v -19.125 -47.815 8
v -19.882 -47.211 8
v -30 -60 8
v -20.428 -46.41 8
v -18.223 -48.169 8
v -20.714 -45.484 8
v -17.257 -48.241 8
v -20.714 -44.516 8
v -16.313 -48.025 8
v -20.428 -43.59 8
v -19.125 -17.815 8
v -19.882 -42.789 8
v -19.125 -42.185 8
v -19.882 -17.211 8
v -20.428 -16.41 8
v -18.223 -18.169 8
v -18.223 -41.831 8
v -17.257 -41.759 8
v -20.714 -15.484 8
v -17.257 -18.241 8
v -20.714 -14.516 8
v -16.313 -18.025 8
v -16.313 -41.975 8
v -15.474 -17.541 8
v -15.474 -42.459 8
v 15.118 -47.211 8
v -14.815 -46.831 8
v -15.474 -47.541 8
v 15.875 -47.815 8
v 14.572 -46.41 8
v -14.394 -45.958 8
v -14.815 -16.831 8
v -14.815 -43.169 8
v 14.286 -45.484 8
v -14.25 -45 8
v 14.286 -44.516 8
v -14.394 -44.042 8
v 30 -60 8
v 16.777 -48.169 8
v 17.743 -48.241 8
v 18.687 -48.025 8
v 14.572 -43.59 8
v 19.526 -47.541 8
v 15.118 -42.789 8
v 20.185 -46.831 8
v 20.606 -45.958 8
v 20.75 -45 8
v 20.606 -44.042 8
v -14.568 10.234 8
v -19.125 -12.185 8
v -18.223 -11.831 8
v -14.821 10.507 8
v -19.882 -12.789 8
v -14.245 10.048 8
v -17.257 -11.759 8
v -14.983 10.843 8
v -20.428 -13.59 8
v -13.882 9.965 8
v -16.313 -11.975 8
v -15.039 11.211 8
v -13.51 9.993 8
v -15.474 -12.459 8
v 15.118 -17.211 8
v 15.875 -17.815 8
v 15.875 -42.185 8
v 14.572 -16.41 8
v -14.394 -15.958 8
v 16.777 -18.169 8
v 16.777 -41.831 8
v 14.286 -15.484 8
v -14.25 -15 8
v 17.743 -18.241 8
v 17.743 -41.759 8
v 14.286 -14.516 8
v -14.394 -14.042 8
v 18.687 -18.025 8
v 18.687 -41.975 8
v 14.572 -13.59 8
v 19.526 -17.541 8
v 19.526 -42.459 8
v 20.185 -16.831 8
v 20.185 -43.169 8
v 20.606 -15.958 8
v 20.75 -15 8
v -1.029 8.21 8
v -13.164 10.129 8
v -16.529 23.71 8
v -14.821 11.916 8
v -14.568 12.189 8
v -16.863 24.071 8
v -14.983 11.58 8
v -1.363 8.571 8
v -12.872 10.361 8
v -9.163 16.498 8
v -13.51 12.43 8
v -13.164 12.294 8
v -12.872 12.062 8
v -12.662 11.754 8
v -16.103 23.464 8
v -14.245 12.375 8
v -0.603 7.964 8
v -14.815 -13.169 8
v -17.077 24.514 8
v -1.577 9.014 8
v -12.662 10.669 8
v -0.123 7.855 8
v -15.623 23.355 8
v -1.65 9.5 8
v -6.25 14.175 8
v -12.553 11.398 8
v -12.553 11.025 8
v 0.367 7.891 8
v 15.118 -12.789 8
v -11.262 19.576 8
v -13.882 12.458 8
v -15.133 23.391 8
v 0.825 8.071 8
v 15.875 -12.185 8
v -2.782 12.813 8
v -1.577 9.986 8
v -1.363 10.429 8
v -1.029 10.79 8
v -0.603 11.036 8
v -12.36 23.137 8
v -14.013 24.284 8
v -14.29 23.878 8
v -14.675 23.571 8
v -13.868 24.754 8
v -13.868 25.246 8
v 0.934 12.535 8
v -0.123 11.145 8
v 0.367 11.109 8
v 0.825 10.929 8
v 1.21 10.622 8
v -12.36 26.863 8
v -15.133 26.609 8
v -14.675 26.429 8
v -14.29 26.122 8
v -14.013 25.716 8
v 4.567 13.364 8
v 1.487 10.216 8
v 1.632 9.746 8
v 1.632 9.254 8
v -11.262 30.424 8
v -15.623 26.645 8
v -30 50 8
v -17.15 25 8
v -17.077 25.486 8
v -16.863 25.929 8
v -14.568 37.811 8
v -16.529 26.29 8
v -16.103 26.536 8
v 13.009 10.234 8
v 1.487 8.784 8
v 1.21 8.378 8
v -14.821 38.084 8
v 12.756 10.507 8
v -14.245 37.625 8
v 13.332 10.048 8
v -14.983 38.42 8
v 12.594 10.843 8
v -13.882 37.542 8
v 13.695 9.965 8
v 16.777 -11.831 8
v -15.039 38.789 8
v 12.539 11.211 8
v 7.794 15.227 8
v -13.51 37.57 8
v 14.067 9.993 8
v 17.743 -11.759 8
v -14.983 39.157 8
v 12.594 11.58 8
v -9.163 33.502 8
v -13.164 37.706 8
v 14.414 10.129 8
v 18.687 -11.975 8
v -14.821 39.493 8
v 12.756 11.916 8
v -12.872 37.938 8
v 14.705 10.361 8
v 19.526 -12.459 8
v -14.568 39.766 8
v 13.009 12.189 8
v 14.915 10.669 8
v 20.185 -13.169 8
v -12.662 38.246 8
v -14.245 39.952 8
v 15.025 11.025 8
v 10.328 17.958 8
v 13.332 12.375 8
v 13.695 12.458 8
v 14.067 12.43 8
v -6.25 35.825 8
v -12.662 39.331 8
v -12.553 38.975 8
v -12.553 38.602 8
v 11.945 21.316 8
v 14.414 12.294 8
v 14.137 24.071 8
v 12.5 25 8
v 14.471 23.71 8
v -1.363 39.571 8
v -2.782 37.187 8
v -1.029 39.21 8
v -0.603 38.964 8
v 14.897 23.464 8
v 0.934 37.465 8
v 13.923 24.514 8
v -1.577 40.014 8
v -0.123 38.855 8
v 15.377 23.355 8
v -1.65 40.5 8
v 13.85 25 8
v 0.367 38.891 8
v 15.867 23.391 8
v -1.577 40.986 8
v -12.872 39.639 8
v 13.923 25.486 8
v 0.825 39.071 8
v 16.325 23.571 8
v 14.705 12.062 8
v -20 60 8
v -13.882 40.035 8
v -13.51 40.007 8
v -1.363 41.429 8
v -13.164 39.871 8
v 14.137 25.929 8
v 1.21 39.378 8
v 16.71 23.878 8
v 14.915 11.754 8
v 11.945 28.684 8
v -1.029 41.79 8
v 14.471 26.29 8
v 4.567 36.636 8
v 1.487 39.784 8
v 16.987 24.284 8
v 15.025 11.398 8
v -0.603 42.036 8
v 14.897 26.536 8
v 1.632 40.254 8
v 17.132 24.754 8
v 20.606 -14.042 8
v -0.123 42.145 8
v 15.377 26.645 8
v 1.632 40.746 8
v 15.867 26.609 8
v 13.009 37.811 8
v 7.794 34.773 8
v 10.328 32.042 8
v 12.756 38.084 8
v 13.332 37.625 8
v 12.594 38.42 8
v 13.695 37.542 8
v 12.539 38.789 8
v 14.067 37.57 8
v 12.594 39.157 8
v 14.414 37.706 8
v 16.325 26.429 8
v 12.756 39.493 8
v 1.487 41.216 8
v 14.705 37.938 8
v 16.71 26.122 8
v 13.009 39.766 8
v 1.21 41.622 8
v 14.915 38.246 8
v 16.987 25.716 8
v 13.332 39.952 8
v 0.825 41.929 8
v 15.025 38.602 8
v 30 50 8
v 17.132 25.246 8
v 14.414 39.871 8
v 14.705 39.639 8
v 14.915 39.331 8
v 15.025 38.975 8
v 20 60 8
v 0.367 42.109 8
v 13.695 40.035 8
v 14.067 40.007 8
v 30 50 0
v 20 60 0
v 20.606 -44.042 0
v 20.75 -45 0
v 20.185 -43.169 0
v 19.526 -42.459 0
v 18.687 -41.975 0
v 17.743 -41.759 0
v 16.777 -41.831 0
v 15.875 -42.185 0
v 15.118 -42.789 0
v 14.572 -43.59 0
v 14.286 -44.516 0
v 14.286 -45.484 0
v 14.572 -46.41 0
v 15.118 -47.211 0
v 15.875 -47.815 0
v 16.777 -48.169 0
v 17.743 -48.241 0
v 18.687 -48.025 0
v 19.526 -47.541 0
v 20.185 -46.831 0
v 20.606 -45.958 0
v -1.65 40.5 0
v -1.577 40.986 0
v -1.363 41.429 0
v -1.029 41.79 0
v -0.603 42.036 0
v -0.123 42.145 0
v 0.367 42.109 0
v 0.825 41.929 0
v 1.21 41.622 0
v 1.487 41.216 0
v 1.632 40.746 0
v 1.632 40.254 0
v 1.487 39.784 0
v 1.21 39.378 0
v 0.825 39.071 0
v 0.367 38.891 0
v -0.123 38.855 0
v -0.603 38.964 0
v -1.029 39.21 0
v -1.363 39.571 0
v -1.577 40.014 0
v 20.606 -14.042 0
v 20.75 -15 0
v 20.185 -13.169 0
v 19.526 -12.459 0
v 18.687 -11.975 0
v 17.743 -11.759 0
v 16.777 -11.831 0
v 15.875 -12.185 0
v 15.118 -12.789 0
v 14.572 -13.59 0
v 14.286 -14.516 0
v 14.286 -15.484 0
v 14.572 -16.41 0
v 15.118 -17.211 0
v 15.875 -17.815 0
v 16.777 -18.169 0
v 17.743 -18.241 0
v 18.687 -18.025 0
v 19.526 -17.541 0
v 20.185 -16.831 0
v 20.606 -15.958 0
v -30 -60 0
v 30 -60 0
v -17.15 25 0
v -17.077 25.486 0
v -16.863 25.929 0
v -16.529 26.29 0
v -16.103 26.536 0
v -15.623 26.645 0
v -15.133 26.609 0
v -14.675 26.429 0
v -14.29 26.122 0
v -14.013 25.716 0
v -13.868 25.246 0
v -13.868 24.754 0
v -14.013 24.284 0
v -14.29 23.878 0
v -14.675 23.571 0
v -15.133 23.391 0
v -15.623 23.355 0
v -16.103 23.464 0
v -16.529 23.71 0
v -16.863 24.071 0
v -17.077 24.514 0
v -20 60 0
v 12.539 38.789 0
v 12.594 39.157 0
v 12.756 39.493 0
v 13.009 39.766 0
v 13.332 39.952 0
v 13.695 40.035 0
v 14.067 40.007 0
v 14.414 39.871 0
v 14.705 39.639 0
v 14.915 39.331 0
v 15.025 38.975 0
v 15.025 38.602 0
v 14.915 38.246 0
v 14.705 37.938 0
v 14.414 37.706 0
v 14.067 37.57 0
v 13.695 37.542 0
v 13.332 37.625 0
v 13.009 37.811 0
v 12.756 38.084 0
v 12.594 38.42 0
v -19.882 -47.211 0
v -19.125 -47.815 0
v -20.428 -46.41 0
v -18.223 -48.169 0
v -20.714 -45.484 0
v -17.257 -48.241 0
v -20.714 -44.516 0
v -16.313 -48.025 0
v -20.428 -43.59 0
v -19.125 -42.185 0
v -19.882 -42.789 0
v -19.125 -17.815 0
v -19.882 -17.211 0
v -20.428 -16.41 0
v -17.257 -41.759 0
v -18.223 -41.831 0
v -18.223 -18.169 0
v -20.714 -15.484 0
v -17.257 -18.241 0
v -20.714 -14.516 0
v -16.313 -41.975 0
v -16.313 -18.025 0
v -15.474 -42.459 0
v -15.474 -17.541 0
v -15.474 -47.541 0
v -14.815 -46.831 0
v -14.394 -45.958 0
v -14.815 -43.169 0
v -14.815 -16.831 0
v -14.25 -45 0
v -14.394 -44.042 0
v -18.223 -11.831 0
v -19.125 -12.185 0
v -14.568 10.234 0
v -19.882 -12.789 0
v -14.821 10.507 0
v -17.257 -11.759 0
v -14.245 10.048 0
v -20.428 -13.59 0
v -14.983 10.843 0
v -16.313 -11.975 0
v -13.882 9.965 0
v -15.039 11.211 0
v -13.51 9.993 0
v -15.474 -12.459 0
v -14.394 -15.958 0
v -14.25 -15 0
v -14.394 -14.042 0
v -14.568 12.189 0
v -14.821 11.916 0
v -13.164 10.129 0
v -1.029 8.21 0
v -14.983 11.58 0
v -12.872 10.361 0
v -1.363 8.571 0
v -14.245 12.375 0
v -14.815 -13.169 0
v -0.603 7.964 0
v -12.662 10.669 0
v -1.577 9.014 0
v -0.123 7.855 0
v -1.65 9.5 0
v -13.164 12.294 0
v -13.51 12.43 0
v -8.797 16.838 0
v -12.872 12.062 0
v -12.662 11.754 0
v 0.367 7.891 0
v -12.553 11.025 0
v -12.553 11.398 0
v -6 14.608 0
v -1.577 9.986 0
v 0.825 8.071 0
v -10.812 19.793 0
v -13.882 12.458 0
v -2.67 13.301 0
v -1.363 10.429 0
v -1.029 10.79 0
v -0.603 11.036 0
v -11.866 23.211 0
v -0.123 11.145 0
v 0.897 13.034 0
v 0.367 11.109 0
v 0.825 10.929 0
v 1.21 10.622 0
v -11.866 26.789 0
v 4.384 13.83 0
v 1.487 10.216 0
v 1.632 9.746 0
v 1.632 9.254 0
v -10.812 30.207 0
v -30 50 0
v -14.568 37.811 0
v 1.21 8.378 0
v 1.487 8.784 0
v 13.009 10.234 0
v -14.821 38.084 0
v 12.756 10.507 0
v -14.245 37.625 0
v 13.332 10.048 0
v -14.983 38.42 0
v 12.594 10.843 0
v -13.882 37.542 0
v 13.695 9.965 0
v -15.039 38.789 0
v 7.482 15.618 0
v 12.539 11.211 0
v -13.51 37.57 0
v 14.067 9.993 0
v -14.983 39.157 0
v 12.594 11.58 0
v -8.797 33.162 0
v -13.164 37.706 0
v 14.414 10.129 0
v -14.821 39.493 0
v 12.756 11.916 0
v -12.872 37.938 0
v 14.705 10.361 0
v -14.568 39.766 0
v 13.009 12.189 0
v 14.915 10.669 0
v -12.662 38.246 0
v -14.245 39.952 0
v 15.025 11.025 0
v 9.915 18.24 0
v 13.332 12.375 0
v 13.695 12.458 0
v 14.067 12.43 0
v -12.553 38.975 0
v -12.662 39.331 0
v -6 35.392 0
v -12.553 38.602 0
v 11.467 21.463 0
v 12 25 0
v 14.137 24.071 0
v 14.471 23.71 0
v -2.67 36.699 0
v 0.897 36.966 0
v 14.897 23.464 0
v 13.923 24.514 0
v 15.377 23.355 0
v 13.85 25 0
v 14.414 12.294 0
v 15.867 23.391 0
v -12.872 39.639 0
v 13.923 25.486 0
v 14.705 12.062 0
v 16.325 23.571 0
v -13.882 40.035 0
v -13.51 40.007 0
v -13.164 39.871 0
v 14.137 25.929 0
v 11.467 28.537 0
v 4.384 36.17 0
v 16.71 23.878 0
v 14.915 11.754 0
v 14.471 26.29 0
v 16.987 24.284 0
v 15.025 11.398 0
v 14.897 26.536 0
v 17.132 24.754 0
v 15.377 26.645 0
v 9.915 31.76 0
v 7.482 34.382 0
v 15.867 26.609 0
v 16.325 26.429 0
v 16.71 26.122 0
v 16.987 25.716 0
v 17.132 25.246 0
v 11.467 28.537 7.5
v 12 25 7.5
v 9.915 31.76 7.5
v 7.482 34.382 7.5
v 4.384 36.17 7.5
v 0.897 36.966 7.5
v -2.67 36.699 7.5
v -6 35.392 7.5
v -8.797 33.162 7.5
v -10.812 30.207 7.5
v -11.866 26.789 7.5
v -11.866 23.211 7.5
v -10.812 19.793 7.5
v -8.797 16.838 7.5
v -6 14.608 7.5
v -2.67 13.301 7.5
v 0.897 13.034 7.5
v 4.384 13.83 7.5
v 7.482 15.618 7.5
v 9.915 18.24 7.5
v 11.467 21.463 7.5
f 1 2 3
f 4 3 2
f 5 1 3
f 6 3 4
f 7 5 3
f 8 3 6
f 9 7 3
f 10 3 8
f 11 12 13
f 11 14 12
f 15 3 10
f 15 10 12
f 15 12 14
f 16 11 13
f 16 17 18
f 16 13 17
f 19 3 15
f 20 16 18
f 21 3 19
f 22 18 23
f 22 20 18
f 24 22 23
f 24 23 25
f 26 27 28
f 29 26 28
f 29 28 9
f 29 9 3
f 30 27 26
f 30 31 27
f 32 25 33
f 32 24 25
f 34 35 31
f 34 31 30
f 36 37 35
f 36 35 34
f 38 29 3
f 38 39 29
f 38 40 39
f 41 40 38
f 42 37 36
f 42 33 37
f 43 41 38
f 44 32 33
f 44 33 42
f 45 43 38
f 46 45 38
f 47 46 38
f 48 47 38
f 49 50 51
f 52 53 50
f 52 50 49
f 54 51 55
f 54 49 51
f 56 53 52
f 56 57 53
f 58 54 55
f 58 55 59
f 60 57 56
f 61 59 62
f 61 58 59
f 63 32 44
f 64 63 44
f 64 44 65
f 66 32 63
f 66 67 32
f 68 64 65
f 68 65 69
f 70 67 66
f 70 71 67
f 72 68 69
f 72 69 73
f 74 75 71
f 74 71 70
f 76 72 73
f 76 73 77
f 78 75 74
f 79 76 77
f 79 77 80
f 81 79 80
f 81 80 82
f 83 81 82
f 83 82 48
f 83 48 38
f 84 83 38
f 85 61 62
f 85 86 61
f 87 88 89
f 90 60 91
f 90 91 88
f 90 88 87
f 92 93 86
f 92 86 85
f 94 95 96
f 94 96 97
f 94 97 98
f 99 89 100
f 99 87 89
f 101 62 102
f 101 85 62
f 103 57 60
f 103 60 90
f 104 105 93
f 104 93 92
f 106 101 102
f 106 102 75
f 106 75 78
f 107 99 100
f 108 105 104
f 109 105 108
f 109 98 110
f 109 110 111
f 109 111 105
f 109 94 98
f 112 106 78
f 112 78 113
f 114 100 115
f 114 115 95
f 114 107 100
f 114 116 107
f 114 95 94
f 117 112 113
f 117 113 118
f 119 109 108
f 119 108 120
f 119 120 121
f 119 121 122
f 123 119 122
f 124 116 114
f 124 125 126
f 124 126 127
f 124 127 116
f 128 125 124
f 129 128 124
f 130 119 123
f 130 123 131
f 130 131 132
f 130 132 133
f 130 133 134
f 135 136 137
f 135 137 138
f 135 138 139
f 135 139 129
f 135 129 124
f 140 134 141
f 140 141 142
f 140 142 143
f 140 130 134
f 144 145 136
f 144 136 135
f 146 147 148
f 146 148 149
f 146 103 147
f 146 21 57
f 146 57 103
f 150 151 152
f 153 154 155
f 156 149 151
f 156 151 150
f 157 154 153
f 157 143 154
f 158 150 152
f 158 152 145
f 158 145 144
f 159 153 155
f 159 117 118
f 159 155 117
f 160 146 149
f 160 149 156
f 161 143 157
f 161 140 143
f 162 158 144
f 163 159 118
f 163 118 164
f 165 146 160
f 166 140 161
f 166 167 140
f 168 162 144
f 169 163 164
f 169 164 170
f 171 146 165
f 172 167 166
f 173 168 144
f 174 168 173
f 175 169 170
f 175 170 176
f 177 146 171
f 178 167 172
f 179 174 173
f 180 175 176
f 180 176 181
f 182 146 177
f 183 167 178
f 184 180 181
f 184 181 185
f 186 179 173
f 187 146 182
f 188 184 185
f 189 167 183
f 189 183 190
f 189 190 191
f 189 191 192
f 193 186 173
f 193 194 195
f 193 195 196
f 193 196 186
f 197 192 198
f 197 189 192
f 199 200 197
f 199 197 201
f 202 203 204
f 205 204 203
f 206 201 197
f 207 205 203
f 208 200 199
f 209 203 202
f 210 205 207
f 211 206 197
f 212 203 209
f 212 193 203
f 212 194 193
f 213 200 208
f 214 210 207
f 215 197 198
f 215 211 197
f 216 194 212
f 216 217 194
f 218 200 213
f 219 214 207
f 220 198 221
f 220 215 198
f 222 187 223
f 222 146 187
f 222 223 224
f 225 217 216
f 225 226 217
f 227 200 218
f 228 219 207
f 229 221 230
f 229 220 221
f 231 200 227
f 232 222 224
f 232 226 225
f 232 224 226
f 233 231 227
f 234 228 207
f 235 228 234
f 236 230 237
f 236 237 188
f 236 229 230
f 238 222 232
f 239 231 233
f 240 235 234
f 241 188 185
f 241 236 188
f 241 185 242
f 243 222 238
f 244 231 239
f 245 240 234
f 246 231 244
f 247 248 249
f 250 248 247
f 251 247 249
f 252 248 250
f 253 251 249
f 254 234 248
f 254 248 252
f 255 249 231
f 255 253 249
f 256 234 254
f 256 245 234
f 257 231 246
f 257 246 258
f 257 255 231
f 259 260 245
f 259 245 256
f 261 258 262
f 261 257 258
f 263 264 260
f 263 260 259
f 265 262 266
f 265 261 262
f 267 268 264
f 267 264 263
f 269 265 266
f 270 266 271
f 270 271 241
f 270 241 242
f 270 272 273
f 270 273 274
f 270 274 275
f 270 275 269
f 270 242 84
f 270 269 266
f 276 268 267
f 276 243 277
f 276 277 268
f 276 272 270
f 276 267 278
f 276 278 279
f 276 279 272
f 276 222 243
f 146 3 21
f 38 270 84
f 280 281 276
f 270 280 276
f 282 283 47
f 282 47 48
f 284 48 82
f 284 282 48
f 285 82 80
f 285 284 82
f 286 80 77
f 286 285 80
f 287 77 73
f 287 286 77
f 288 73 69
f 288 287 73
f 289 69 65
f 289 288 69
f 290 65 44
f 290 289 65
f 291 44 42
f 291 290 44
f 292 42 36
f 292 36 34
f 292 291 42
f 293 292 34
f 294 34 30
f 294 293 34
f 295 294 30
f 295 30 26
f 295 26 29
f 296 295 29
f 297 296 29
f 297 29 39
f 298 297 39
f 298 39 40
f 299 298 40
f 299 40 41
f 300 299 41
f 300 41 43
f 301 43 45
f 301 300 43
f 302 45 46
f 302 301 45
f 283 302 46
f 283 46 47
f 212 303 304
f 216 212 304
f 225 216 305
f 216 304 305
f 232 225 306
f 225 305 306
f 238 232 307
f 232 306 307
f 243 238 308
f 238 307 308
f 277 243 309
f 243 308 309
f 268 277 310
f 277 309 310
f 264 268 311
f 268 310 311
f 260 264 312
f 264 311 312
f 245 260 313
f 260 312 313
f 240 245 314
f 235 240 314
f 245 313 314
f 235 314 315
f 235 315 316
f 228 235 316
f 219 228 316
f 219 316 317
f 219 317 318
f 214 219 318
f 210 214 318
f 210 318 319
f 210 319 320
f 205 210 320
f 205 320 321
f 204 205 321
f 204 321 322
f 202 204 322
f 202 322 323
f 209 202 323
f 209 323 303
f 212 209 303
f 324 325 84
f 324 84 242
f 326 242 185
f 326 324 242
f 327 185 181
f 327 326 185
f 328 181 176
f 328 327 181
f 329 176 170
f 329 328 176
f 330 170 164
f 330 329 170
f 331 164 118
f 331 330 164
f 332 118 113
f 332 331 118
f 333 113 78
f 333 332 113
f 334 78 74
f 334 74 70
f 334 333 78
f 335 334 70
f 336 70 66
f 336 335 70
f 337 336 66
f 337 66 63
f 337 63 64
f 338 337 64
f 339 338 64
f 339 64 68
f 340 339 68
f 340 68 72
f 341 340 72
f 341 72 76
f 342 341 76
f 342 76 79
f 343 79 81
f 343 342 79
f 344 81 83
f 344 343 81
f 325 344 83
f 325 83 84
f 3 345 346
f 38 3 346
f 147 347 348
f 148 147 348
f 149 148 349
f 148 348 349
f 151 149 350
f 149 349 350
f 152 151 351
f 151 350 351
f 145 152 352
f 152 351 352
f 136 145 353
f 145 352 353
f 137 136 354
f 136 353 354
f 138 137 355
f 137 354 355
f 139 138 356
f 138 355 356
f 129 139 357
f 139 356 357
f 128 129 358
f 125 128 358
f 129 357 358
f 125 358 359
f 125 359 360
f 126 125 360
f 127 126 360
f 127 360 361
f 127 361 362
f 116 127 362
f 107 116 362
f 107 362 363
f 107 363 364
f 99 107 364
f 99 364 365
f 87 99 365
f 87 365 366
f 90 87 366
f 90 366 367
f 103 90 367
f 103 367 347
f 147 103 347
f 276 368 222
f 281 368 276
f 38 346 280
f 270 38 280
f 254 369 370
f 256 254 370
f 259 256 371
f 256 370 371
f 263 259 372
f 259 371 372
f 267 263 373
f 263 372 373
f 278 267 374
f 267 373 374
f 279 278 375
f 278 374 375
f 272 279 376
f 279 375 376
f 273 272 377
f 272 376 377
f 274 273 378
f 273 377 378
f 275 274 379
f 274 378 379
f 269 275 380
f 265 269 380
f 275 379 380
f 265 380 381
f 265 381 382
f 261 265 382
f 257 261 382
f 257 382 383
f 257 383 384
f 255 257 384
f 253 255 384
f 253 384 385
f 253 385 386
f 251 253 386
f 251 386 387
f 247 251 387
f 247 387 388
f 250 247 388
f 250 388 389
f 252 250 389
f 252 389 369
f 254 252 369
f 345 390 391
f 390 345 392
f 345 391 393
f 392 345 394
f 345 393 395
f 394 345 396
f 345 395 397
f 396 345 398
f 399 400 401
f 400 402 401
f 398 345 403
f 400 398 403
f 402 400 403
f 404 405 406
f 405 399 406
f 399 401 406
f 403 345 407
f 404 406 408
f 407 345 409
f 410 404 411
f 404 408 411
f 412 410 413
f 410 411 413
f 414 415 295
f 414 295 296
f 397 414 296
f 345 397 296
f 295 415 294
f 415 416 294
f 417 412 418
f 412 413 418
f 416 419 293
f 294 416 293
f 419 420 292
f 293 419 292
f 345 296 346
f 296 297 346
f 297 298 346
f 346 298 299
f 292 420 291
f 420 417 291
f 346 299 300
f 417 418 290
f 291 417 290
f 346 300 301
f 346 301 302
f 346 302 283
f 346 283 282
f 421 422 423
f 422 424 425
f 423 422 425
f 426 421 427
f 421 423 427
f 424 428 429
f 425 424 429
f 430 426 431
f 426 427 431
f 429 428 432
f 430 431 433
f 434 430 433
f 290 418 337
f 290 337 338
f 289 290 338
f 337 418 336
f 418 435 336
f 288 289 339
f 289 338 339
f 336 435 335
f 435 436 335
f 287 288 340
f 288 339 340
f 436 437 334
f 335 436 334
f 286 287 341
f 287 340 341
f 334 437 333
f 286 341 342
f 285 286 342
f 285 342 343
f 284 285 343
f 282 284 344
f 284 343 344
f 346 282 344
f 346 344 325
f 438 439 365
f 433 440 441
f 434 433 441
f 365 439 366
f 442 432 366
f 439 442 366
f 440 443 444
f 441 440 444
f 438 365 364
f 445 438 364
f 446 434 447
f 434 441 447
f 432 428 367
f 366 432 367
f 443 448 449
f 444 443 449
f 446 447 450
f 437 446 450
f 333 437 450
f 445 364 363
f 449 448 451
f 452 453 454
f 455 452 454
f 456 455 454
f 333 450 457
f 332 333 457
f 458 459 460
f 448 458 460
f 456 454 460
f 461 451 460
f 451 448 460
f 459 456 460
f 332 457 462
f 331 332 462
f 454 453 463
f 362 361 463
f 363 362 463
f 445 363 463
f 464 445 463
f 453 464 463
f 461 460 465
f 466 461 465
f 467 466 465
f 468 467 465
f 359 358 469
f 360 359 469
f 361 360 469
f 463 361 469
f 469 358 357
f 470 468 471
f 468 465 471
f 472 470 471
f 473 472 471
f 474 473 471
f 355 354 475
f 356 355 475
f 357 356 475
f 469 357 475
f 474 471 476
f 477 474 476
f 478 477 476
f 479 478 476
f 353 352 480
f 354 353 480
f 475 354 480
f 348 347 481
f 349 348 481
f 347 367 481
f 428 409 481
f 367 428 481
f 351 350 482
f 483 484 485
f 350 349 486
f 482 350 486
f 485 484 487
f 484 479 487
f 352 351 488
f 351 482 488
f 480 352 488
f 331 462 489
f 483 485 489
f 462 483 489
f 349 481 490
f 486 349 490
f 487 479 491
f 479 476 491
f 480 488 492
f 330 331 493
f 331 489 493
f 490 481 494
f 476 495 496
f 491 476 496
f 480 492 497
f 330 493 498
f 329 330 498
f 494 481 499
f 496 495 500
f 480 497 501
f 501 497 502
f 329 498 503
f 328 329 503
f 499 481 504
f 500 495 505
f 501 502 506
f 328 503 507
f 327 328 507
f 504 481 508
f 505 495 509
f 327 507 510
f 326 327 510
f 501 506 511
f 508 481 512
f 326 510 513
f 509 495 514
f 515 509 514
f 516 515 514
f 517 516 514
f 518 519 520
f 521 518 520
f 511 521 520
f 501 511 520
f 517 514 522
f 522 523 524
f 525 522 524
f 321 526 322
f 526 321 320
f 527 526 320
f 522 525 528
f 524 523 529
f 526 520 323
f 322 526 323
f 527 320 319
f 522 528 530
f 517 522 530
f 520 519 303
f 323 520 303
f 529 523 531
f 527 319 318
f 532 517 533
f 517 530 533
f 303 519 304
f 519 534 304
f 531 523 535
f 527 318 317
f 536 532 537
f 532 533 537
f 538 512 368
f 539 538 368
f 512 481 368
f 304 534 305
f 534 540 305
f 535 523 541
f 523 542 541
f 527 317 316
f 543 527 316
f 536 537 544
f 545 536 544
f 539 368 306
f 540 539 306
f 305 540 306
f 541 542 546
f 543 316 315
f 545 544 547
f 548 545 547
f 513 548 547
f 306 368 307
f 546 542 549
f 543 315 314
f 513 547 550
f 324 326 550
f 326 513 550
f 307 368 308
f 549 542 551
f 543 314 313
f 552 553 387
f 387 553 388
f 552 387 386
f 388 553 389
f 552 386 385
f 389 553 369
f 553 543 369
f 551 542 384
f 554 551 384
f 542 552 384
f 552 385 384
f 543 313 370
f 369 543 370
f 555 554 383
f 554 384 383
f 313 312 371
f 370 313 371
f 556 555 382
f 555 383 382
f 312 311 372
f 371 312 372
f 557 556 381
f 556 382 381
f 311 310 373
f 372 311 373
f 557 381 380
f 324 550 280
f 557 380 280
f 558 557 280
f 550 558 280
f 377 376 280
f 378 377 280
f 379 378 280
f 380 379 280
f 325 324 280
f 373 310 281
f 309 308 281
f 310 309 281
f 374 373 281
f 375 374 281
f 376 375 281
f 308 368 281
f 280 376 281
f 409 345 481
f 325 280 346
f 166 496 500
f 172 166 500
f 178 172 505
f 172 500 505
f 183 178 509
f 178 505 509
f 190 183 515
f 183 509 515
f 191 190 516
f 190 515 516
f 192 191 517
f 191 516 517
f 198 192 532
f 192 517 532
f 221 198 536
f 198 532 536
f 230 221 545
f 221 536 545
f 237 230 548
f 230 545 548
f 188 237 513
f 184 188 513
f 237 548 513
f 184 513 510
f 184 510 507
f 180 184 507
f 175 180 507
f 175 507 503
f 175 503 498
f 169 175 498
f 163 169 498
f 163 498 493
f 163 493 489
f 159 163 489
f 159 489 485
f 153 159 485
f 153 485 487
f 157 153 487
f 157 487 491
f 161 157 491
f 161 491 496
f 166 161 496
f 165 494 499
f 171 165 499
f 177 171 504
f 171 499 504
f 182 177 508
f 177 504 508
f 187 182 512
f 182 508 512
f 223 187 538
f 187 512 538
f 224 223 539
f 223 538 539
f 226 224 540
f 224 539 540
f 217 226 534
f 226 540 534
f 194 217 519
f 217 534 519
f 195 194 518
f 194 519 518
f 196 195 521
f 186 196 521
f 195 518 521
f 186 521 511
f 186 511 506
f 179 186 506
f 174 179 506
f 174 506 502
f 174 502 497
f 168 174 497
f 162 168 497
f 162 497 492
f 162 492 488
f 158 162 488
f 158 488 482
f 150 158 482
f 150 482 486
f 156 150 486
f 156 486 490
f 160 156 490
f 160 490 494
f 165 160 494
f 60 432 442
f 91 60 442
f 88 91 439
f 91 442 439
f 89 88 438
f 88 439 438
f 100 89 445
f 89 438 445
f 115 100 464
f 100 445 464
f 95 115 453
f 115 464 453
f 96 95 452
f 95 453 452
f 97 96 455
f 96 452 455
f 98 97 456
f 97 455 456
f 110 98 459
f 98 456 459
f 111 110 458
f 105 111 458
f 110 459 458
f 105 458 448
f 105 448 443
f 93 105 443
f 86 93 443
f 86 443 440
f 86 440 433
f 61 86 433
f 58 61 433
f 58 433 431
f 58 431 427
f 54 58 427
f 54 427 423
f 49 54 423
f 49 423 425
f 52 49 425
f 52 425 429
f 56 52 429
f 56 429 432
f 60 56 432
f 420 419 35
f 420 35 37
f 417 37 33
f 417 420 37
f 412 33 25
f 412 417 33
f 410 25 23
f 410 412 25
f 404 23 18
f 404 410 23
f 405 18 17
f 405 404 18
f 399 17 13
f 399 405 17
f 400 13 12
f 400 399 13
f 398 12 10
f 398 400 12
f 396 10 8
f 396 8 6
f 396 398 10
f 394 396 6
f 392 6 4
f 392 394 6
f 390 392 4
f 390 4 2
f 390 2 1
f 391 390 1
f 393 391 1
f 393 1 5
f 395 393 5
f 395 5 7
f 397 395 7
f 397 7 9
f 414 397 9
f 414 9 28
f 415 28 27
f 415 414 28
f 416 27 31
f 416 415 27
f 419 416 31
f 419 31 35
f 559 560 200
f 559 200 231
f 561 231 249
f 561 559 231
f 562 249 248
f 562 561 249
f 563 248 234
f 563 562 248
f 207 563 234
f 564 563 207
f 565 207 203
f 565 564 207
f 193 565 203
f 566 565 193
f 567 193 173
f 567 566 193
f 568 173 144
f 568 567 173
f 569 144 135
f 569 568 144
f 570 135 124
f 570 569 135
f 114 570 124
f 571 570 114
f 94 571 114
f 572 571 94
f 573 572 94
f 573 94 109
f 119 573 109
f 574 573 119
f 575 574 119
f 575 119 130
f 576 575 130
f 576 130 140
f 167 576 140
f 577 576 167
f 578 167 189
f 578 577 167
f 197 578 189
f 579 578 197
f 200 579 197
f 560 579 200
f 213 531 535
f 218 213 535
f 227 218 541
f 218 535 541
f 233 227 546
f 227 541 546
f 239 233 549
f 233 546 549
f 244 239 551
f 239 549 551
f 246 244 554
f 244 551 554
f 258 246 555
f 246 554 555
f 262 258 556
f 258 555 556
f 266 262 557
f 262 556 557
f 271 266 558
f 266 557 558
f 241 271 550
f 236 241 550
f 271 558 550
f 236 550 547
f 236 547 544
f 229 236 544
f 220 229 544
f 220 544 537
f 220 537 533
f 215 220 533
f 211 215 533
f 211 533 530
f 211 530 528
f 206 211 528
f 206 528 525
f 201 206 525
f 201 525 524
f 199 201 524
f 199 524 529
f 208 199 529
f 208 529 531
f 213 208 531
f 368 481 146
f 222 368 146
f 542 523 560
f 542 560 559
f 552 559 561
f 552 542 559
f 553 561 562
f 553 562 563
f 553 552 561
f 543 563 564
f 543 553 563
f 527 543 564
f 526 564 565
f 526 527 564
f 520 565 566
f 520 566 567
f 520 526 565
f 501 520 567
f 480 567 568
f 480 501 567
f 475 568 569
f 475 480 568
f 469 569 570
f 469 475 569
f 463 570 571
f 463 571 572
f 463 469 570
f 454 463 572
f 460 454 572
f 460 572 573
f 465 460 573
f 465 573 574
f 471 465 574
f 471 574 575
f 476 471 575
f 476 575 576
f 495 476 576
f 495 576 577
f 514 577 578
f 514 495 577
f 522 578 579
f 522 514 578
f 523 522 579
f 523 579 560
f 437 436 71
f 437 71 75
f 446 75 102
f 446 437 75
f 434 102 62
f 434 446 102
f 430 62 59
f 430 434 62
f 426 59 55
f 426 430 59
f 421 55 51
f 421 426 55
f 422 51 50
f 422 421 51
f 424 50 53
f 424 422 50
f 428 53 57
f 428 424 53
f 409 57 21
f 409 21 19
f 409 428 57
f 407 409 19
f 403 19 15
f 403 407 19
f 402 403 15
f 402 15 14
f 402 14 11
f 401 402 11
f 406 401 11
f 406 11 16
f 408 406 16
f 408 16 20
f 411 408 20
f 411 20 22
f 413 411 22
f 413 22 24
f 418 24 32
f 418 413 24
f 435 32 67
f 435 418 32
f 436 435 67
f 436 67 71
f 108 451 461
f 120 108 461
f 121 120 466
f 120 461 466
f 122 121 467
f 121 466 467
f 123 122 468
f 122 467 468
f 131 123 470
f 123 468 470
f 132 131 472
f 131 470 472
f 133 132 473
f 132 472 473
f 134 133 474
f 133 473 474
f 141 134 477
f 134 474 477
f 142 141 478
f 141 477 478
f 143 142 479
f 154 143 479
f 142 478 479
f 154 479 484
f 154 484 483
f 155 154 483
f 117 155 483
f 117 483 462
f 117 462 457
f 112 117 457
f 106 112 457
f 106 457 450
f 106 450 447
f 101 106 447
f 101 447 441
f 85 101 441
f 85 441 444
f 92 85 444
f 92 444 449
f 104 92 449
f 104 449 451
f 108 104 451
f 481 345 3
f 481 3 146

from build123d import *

# Parameters (mm, degrees)
SKETCH1_W           = 60
SKETCH1_H           = 120
SKETCH1_R           = 3.25
SKETCH1_R_2         = 12
BOSS_EXTRUDE1_DEPTH = 8
M3_TAPPED_HOLE1_D   = 2.5
M4_TAPPED_HOLE1_D   = 3.3
CHAMFER1_SIZE       = 0.5
CHAMFER2_SIZE       = 10


with BuildPart() as part:
    # Sketch1 → Boss-Extrude1 (new body)
    with BuildSketch(Plane.XY):
        Rectangle(SKETCH1_W, SKETCH1_H)
        with Locations((-17.5, -15)):
            Circle(SKETCH1_R, mode=Mode.SUBTRACT)
        with Locations((-17.5, -45)):
            Circle(SKETCH1_R, mode=Mode.SUBTRACT)
        with Locations((17.5, -45)):
            Circle(SKETCH1_R, mode=Mode.SUBTRACT)
        with Locations((17.5, -15)):
            Circle(SKETCH1_R, mode=Mode.SUBTRACT)
        with Locations((0, 25)):
            Circle(SKETCH1_R_2, mode=Mode.SUBTRACT)
    extrude(amount=BOSS_EXTRUDE1_DEPTH)

    # M3 Tapped Hole1 (through all)
    with Locations(Plane.XY.offset(8)):
        with Locations((-13.788582233, 38.788582233), (-13.788582233, 11.211417767), (13.788582233, 11.211417767), (13.788582233, 38.788582233)):
            Hole(M3_TAPPED_HOLE1_D / 2)

    # M4 Tapped Hole1 (through all)
    with Locations(Plane.XY.offset(8)):
        with Locations((-15.5, 25), (0, 40.5), (15.5, 25), (0, 9.5)):
            Hole(M4_TAPPED_HOLE1_D / 2)

    # Chamfer1
    chamfer1_edges = [part.edges().sort_by_distance(p)[0] for p in [
        (-12, 25, 8),
    ]]
    chamfer(chamfer1_edges, length=CHAMFER1_SIZE)

    # Chamfer2
    chamfer2_edges = [part.edges().sort_by_distance(p)[0] for p in [
        (-30, 60, 4),
        (30, 60, 4),
    ]]
    chamfer(chamfer2_edges, length=CHAMFER2_SIZE)


solid = part.part
